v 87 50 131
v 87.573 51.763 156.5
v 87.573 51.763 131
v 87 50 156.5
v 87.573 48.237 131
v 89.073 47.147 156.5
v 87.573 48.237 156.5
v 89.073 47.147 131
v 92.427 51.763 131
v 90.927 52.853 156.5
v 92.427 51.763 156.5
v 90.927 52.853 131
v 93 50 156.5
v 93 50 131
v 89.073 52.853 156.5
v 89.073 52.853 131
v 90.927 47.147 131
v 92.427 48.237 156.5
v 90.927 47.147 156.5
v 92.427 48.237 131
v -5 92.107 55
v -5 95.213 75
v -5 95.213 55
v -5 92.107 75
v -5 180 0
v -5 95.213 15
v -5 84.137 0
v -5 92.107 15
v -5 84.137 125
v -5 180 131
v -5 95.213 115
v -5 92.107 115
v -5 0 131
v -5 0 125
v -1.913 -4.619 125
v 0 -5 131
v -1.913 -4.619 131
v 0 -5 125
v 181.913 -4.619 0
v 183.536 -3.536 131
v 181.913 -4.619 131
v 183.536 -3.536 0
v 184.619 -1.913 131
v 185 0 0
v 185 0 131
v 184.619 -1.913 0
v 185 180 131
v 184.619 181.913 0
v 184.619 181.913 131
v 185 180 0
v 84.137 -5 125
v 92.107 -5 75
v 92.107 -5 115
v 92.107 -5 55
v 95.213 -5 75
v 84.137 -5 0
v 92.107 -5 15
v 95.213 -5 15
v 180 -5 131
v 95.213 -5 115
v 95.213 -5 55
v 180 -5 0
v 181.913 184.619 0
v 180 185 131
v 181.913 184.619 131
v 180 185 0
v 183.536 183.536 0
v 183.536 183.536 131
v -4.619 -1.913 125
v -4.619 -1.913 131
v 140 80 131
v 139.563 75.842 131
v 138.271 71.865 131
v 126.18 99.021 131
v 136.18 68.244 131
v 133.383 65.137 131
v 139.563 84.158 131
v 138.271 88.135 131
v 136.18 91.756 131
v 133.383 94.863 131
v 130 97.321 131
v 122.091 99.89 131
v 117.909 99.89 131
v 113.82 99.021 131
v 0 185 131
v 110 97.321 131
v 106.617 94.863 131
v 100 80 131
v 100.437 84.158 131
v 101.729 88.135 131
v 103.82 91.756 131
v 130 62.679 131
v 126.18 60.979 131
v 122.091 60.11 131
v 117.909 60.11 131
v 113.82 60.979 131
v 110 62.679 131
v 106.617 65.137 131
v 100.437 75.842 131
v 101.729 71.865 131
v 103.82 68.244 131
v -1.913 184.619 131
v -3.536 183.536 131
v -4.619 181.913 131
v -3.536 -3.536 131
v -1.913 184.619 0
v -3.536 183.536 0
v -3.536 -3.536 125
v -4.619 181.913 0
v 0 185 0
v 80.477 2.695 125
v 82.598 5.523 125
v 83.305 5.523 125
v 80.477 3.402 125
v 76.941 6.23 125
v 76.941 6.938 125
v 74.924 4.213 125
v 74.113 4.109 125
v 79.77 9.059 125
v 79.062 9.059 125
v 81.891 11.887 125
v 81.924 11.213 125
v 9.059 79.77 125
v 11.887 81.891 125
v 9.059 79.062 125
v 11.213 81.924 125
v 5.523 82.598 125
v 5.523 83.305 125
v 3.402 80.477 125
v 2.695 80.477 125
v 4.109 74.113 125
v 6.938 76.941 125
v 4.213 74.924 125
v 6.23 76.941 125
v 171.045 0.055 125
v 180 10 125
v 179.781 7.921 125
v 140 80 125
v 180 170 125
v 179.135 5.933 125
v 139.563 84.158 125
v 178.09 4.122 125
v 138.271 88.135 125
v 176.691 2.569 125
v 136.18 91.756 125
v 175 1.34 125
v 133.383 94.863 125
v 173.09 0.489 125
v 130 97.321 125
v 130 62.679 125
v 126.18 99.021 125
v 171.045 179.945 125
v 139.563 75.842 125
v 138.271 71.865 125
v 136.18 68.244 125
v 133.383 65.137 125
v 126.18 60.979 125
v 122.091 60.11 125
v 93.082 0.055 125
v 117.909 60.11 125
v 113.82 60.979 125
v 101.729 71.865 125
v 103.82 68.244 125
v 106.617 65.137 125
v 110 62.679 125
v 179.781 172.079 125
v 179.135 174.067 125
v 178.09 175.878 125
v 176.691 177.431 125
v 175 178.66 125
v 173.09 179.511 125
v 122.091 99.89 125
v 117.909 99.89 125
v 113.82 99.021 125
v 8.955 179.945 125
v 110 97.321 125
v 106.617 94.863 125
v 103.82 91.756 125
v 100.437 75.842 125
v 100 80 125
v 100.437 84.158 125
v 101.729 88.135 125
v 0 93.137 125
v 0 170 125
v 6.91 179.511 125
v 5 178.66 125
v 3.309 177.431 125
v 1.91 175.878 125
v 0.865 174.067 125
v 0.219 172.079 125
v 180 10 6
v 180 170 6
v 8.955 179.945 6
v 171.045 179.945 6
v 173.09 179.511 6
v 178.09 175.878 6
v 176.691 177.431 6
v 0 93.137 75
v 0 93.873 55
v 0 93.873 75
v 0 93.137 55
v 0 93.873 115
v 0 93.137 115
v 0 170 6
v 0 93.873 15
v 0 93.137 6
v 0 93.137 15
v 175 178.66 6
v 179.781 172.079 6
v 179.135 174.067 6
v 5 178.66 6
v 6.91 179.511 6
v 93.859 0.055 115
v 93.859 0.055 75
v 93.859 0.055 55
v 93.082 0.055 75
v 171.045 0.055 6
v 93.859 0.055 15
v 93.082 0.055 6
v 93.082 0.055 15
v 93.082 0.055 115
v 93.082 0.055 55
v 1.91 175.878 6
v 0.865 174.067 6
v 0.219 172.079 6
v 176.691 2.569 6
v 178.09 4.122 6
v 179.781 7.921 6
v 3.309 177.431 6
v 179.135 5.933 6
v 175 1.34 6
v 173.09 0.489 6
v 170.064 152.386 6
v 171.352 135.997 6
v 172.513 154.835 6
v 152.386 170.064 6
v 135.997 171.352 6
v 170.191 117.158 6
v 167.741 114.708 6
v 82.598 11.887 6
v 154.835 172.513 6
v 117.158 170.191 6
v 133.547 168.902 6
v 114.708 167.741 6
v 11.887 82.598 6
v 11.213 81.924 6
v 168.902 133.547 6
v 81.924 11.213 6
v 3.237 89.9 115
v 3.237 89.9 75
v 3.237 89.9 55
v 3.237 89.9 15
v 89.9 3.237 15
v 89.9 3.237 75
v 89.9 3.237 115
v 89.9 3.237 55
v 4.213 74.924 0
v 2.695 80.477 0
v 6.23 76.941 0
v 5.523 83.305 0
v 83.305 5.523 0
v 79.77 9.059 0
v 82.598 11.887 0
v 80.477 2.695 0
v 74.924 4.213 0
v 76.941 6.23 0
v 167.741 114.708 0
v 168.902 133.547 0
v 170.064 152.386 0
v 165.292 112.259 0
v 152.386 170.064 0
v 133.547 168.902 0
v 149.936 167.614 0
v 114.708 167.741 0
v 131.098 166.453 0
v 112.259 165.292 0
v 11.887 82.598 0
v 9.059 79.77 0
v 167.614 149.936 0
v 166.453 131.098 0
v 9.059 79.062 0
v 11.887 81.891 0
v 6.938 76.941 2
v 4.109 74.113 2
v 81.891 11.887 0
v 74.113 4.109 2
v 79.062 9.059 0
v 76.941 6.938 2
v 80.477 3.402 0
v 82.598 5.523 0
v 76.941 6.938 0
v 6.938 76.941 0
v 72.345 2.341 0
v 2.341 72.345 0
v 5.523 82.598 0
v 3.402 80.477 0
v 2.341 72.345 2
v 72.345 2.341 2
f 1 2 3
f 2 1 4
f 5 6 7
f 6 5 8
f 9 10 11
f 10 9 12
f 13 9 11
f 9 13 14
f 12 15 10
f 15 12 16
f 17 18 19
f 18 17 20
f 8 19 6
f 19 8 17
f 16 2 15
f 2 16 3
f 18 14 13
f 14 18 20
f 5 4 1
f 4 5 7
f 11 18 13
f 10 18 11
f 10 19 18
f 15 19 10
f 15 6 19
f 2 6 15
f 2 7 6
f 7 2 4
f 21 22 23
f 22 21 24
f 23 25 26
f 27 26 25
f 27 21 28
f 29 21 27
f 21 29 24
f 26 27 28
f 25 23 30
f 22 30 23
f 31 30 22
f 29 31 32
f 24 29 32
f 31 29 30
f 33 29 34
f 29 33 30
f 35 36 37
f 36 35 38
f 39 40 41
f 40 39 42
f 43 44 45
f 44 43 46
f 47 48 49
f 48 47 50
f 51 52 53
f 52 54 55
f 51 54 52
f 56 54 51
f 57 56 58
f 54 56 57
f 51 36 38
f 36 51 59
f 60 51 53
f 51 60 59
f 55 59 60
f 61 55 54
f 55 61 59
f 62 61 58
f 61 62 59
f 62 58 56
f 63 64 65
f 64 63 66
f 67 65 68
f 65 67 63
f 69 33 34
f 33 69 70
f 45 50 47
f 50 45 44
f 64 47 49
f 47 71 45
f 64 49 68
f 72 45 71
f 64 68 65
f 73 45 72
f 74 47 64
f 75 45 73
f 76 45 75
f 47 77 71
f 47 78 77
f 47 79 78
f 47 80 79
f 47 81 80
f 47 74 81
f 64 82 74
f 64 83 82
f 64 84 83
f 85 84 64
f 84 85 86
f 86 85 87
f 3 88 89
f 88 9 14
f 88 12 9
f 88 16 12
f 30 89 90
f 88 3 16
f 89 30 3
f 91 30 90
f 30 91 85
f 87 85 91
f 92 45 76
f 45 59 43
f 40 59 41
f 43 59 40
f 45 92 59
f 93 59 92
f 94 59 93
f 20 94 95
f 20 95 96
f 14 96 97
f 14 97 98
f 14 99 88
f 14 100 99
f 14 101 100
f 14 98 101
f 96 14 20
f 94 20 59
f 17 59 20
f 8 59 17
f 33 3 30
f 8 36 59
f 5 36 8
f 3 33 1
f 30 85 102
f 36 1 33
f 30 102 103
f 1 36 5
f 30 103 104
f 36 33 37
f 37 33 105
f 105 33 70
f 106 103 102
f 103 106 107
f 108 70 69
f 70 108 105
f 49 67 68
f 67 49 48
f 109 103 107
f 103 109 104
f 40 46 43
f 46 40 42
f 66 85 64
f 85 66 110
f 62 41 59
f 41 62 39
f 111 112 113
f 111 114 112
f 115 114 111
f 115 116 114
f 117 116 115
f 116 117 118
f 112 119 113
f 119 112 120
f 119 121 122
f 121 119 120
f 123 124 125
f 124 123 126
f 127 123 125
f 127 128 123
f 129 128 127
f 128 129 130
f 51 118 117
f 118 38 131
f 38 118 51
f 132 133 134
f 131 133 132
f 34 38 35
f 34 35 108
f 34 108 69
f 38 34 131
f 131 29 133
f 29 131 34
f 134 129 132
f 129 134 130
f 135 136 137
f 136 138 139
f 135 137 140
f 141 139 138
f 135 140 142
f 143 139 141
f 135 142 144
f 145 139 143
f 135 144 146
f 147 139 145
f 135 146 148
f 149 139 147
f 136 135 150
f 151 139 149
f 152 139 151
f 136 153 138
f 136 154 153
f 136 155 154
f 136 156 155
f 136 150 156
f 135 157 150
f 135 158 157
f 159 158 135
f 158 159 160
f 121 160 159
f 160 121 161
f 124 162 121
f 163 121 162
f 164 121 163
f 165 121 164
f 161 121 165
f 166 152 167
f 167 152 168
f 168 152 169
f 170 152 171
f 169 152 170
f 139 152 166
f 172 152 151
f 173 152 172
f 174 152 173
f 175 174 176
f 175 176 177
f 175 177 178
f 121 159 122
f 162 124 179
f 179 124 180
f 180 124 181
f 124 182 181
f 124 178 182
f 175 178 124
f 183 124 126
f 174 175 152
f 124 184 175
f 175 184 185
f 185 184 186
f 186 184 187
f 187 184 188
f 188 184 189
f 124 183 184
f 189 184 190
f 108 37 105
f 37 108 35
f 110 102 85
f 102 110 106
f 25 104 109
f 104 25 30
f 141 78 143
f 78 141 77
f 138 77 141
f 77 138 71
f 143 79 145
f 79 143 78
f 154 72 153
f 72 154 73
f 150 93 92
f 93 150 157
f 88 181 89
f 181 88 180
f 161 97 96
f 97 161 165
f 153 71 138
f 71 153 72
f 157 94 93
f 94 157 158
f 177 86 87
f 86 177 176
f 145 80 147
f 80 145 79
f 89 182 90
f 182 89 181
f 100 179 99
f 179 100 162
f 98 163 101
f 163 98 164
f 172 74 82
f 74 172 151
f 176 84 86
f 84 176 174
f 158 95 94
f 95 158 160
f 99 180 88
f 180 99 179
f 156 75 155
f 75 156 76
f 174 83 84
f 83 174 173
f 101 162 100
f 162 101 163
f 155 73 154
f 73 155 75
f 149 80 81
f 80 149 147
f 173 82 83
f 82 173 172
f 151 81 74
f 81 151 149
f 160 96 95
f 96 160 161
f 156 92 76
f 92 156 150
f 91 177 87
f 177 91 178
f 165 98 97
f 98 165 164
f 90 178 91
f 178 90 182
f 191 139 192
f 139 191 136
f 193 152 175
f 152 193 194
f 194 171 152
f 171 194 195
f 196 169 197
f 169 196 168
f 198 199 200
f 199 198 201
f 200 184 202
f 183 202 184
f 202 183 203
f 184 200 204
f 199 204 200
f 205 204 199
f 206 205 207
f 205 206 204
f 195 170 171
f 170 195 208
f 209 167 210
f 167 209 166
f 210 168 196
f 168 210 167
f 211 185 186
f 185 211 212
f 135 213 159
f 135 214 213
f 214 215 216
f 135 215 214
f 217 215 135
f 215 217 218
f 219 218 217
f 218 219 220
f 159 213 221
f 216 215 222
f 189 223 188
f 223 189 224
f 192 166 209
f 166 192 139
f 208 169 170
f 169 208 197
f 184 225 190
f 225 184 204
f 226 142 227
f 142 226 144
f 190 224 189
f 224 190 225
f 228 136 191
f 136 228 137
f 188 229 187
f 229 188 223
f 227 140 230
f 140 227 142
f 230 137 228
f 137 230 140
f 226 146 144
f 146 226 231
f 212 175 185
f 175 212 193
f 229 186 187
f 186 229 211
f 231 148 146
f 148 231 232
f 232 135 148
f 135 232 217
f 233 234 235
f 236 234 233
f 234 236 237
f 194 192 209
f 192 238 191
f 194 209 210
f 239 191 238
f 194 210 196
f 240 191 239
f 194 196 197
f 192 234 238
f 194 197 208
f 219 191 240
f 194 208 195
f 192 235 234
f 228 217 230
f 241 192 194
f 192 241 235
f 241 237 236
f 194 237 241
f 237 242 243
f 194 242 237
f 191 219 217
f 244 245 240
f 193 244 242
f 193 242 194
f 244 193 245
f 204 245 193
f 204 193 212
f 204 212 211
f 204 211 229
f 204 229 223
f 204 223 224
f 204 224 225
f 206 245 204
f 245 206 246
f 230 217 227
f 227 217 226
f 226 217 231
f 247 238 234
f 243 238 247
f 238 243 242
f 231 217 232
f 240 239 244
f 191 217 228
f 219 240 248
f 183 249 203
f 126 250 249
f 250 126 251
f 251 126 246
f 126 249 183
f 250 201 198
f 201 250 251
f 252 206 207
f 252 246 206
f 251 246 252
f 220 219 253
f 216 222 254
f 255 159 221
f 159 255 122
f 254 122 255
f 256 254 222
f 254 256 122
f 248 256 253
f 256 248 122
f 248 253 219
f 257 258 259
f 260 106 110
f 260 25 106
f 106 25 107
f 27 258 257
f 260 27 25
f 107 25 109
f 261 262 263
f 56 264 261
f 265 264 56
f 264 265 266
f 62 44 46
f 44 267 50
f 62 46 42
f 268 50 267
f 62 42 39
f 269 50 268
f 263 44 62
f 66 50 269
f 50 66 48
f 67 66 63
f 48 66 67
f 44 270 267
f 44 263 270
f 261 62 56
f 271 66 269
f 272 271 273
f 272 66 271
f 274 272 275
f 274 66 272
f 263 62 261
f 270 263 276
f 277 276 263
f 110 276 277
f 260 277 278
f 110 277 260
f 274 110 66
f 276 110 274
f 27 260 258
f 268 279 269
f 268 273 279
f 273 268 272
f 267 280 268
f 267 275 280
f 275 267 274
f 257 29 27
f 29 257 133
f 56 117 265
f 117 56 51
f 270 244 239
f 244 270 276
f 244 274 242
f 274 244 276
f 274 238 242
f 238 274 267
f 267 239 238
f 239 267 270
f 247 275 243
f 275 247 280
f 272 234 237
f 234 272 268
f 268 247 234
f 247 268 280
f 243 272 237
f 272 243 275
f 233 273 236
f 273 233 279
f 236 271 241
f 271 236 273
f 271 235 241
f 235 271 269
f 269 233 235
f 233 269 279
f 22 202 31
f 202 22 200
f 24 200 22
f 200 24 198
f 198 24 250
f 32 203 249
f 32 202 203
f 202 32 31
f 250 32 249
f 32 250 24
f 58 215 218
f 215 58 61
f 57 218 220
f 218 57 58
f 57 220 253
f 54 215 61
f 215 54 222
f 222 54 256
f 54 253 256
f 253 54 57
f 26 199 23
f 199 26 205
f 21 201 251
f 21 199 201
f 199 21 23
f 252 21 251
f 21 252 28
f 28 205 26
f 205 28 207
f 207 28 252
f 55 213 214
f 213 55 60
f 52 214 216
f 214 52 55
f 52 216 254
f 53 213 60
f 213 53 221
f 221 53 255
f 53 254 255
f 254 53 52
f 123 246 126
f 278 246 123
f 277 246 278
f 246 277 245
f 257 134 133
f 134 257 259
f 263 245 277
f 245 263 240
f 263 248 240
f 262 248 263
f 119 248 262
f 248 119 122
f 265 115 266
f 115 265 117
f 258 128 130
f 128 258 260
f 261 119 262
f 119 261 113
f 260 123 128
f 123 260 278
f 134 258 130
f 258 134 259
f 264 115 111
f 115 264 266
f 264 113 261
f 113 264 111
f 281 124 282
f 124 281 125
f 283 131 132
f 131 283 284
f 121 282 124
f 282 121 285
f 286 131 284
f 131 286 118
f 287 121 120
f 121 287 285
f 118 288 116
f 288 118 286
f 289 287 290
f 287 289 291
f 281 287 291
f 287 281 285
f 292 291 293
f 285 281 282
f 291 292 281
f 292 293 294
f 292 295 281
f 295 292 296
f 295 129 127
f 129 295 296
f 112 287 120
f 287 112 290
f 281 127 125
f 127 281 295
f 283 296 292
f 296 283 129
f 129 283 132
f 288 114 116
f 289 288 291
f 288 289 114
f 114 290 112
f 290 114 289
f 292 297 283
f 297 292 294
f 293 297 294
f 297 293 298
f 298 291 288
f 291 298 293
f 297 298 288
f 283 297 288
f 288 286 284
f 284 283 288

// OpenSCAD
/* [Global] */

// Which part would you like to make?
part = "a"; // [a:Assembled (without mount),d:Decoration,f:Front,b:Back,p:Plate,m:Mount]

// How much gap (microns) should be left between fitting, unattached, parts?
microngap = 50; // [10:200]

// What diameter (mm) should the entry hole in the decoration or front have?
entrydia = 40; // [20:60]

// How tall (mm) should the mount be?
mounttall = 50; // [25:100]


/* [Hidden] */


module decor() {
	difference() {
		union () {
			translate([-20,-90,0]) {
				linear_extrude(height = 2.5) import("decor.dxf");
			}
			translate([90,50,0.5]) cylinder(h=26, r=3);
		}
		translate([120,80,-23]) cylinder(h=100, r=entrydia/2);
	}
}

module front() {
	difference() {
		union () {
			minkowski() {
				cube(size=[180,180,4]);
				cylinder(h=2, r=5);
			}
			translate([0,0,5]) decor();
		}
		translate([120,80,-23]) cylinder(h=100, r=entrydia/2);
	}
}

module plainback() {
	difference() {
		minkowski() {
			cube(size=[180,180,125-2]);
			cylinder(h=2, r=5);
		}
		difference() {
			translate([10,10,6]) minkowski() {
				cube(size=[160,160,390]);
				cylinder(h=2, r=10);
			}
			translate([-10,-10,-20]) rotate([0,0,45])
				cube(size=[160,160,350], center=true);

		}
		translate([-17,-17,-70]) rotate([0,0,45])
			cube(size=[160,160,500], center=true);

		// air vents
		translate([140,140,0]) rotate([0,-60,45]) cube(size=[25,75,3], center=true);
		translate([150,150,0]) rotate([0,-60,45]) cube(size=[25,50,3], center=true);
		translate([160,160,0]) rotate([0,-60,45]) cube(size=[25,25,3], center=true);

		// base drain
		translate([-10,95,95]) rotate([-30,90,45]) cube(size=[40,50,3], center=true);
		translate([95,-10,35]) rotate([30,90,45]) cube(size=[40,50,3], center=true);
		translate([-10,95,35]) rotate([-30,90,45]) cube(size=[40,50,3], center=true);
		translate([95,-10,95]) rotate([30,90,45]) cube(size=[40,50,3], center=true);
	}
}

module back() {
	union() {
		difference() {
			// the back design without removable floor
			plainback();

			// remove mounting/clean-out plate
			translate([43,43,54.9]) rotate([270,180,-45]) union() {
				cube(size=[100,150,12], center=true);	
				cube(size=[110,150,4], center=true);
			}
		}

		// Dietz 2013 inside
		translate([55,200,1]) rotate([0,0,-45])
		linear_extrude(height = 6) import("logo.dxf", center=true);
	}
}

module plate(tol=0.4) {
	// mounting/clean-out plate
	// could difference cylinders for mounting holes from this,
	// but it isn't clear what the mounting holes should be
	union() {
		// the plate itself...
		translate([43,43,125/2]) rotate([270,180,-45]) union() {
			cube(size=[100-(tol*2),125,12-(tol*2)], center=true);	
			cube(size=[110-(tol*2),125,4-(tol*2)], center=true);
		}

		// with 2x2mm tab for easier removal
		translate([43,43,1]) rotate([270,180,-45])
			translate([0,0,-4]) cube(size=[100-(tol*2),2,8], center=true);
	}
}

module assembled(tol=0.4) {
	// tolerance is gap for fitting plate
	union() {
		// each piece is defined in printing position,
		// but front() must be translated to make complete model
		translate([0,0,125]) front();
		back();
		plate(tol);
	}
}

module mount(tall=50) {
	// there were issues with the DXF file...
	// simply rescale the STL
	scale([1,1,tall/50])
	import(file="mount.stl");
}


print_part();

module print_part() {
	if (part == "d") {
		decor();
	} else if (part == "f") {
		front();
	} else if (part == "b") {
		back();
	} else if (part == "p") {
		plate(microngap / 100);
	} else if (part == "m") {
		mount(mounttall);
	} else {
		assembled(microngap / 100);
	}
}
